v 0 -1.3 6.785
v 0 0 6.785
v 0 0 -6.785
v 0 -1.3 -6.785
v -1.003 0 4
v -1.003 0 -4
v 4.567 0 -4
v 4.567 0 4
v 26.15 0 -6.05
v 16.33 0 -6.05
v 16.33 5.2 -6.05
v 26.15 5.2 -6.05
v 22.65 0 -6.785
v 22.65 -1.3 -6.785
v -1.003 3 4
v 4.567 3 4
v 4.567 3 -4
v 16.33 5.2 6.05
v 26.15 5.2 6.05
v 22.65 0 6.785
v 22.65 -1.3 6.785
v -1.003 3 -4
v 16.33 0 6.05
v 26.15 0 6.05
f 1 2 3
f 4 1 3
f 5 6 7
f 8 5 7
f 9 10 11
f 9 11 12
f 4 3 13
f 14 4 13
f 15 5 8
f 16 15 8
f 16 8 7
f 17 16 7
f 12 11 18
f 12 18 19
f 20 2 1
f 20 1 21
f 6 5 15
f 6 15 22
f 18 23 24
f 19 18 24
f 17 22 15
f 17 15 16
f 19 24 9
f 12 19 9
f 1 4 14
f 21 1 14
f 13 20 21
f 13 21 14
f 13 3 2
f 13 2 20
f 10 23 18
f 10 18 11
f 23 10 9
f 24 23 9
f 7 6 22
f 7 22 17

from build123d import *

# Parameters (mm, degrees)
SKETCH1_W           = 22.65
SKETCH1_H           = 13.57
BOSS_EXTRUDE1_DEPTH = 1.3
SKETCH1_3_W         = 9.82
SKETCH1_3_H         = 12.1
BOSS_EXTRUDE2_DEPTH = 5.2
SKETCH1_4_W         = 5.57
SKETCH1_4_H         = 8
BOSS_EXTRUDE3_DEPTH = 3


with BuildPart() as part:
    # Sketch1 → Boss-Extrude1 (new body)
    with BuildSketch(Plane(origin=(0, 0, 0), x_dir=(1, 0, 0), z_dir=(0, 1, 0))):
        with Locations((11.325, 0)):
            Rectangle(SKETCH1_W, SKETCH1_H)
    extrude(amount=-BOSS_EXTRUDE1_DEPTH)


with BuildPart() as body_2:
    # Sketch1<3> → Boss-Extrude2 (new body)
    with BuildSketch(Plane(origin=(0, 0, 0), x_dir=(1, 0, 0), z_dir=(0, 1, 0))):
        with Locations((21.24, 0)):
            Rectangle(SKETCH1_3_W, SKETCH1_3_H)
    extrude(amount=BOSS_EXTRUDE2_DEPTH)


with BuildPart() as body_3:
    # Sketch1<4> → Boss-Extrude3 (new body)
    with BuildSketch(Plane(origin=(0, 0, 0), x_dir=(1, 0, 0), z_dir=(0, 1, 0))):
        with Locations((1.78159017, 0)):
            Rectangle(SKETCH1_4_W, SKETCH1_4_H)
    extrude(amount=BOSS_EXTRUDE3_DEPTH)


solid = Compound([part.part, body_2.part, body_3.part])
